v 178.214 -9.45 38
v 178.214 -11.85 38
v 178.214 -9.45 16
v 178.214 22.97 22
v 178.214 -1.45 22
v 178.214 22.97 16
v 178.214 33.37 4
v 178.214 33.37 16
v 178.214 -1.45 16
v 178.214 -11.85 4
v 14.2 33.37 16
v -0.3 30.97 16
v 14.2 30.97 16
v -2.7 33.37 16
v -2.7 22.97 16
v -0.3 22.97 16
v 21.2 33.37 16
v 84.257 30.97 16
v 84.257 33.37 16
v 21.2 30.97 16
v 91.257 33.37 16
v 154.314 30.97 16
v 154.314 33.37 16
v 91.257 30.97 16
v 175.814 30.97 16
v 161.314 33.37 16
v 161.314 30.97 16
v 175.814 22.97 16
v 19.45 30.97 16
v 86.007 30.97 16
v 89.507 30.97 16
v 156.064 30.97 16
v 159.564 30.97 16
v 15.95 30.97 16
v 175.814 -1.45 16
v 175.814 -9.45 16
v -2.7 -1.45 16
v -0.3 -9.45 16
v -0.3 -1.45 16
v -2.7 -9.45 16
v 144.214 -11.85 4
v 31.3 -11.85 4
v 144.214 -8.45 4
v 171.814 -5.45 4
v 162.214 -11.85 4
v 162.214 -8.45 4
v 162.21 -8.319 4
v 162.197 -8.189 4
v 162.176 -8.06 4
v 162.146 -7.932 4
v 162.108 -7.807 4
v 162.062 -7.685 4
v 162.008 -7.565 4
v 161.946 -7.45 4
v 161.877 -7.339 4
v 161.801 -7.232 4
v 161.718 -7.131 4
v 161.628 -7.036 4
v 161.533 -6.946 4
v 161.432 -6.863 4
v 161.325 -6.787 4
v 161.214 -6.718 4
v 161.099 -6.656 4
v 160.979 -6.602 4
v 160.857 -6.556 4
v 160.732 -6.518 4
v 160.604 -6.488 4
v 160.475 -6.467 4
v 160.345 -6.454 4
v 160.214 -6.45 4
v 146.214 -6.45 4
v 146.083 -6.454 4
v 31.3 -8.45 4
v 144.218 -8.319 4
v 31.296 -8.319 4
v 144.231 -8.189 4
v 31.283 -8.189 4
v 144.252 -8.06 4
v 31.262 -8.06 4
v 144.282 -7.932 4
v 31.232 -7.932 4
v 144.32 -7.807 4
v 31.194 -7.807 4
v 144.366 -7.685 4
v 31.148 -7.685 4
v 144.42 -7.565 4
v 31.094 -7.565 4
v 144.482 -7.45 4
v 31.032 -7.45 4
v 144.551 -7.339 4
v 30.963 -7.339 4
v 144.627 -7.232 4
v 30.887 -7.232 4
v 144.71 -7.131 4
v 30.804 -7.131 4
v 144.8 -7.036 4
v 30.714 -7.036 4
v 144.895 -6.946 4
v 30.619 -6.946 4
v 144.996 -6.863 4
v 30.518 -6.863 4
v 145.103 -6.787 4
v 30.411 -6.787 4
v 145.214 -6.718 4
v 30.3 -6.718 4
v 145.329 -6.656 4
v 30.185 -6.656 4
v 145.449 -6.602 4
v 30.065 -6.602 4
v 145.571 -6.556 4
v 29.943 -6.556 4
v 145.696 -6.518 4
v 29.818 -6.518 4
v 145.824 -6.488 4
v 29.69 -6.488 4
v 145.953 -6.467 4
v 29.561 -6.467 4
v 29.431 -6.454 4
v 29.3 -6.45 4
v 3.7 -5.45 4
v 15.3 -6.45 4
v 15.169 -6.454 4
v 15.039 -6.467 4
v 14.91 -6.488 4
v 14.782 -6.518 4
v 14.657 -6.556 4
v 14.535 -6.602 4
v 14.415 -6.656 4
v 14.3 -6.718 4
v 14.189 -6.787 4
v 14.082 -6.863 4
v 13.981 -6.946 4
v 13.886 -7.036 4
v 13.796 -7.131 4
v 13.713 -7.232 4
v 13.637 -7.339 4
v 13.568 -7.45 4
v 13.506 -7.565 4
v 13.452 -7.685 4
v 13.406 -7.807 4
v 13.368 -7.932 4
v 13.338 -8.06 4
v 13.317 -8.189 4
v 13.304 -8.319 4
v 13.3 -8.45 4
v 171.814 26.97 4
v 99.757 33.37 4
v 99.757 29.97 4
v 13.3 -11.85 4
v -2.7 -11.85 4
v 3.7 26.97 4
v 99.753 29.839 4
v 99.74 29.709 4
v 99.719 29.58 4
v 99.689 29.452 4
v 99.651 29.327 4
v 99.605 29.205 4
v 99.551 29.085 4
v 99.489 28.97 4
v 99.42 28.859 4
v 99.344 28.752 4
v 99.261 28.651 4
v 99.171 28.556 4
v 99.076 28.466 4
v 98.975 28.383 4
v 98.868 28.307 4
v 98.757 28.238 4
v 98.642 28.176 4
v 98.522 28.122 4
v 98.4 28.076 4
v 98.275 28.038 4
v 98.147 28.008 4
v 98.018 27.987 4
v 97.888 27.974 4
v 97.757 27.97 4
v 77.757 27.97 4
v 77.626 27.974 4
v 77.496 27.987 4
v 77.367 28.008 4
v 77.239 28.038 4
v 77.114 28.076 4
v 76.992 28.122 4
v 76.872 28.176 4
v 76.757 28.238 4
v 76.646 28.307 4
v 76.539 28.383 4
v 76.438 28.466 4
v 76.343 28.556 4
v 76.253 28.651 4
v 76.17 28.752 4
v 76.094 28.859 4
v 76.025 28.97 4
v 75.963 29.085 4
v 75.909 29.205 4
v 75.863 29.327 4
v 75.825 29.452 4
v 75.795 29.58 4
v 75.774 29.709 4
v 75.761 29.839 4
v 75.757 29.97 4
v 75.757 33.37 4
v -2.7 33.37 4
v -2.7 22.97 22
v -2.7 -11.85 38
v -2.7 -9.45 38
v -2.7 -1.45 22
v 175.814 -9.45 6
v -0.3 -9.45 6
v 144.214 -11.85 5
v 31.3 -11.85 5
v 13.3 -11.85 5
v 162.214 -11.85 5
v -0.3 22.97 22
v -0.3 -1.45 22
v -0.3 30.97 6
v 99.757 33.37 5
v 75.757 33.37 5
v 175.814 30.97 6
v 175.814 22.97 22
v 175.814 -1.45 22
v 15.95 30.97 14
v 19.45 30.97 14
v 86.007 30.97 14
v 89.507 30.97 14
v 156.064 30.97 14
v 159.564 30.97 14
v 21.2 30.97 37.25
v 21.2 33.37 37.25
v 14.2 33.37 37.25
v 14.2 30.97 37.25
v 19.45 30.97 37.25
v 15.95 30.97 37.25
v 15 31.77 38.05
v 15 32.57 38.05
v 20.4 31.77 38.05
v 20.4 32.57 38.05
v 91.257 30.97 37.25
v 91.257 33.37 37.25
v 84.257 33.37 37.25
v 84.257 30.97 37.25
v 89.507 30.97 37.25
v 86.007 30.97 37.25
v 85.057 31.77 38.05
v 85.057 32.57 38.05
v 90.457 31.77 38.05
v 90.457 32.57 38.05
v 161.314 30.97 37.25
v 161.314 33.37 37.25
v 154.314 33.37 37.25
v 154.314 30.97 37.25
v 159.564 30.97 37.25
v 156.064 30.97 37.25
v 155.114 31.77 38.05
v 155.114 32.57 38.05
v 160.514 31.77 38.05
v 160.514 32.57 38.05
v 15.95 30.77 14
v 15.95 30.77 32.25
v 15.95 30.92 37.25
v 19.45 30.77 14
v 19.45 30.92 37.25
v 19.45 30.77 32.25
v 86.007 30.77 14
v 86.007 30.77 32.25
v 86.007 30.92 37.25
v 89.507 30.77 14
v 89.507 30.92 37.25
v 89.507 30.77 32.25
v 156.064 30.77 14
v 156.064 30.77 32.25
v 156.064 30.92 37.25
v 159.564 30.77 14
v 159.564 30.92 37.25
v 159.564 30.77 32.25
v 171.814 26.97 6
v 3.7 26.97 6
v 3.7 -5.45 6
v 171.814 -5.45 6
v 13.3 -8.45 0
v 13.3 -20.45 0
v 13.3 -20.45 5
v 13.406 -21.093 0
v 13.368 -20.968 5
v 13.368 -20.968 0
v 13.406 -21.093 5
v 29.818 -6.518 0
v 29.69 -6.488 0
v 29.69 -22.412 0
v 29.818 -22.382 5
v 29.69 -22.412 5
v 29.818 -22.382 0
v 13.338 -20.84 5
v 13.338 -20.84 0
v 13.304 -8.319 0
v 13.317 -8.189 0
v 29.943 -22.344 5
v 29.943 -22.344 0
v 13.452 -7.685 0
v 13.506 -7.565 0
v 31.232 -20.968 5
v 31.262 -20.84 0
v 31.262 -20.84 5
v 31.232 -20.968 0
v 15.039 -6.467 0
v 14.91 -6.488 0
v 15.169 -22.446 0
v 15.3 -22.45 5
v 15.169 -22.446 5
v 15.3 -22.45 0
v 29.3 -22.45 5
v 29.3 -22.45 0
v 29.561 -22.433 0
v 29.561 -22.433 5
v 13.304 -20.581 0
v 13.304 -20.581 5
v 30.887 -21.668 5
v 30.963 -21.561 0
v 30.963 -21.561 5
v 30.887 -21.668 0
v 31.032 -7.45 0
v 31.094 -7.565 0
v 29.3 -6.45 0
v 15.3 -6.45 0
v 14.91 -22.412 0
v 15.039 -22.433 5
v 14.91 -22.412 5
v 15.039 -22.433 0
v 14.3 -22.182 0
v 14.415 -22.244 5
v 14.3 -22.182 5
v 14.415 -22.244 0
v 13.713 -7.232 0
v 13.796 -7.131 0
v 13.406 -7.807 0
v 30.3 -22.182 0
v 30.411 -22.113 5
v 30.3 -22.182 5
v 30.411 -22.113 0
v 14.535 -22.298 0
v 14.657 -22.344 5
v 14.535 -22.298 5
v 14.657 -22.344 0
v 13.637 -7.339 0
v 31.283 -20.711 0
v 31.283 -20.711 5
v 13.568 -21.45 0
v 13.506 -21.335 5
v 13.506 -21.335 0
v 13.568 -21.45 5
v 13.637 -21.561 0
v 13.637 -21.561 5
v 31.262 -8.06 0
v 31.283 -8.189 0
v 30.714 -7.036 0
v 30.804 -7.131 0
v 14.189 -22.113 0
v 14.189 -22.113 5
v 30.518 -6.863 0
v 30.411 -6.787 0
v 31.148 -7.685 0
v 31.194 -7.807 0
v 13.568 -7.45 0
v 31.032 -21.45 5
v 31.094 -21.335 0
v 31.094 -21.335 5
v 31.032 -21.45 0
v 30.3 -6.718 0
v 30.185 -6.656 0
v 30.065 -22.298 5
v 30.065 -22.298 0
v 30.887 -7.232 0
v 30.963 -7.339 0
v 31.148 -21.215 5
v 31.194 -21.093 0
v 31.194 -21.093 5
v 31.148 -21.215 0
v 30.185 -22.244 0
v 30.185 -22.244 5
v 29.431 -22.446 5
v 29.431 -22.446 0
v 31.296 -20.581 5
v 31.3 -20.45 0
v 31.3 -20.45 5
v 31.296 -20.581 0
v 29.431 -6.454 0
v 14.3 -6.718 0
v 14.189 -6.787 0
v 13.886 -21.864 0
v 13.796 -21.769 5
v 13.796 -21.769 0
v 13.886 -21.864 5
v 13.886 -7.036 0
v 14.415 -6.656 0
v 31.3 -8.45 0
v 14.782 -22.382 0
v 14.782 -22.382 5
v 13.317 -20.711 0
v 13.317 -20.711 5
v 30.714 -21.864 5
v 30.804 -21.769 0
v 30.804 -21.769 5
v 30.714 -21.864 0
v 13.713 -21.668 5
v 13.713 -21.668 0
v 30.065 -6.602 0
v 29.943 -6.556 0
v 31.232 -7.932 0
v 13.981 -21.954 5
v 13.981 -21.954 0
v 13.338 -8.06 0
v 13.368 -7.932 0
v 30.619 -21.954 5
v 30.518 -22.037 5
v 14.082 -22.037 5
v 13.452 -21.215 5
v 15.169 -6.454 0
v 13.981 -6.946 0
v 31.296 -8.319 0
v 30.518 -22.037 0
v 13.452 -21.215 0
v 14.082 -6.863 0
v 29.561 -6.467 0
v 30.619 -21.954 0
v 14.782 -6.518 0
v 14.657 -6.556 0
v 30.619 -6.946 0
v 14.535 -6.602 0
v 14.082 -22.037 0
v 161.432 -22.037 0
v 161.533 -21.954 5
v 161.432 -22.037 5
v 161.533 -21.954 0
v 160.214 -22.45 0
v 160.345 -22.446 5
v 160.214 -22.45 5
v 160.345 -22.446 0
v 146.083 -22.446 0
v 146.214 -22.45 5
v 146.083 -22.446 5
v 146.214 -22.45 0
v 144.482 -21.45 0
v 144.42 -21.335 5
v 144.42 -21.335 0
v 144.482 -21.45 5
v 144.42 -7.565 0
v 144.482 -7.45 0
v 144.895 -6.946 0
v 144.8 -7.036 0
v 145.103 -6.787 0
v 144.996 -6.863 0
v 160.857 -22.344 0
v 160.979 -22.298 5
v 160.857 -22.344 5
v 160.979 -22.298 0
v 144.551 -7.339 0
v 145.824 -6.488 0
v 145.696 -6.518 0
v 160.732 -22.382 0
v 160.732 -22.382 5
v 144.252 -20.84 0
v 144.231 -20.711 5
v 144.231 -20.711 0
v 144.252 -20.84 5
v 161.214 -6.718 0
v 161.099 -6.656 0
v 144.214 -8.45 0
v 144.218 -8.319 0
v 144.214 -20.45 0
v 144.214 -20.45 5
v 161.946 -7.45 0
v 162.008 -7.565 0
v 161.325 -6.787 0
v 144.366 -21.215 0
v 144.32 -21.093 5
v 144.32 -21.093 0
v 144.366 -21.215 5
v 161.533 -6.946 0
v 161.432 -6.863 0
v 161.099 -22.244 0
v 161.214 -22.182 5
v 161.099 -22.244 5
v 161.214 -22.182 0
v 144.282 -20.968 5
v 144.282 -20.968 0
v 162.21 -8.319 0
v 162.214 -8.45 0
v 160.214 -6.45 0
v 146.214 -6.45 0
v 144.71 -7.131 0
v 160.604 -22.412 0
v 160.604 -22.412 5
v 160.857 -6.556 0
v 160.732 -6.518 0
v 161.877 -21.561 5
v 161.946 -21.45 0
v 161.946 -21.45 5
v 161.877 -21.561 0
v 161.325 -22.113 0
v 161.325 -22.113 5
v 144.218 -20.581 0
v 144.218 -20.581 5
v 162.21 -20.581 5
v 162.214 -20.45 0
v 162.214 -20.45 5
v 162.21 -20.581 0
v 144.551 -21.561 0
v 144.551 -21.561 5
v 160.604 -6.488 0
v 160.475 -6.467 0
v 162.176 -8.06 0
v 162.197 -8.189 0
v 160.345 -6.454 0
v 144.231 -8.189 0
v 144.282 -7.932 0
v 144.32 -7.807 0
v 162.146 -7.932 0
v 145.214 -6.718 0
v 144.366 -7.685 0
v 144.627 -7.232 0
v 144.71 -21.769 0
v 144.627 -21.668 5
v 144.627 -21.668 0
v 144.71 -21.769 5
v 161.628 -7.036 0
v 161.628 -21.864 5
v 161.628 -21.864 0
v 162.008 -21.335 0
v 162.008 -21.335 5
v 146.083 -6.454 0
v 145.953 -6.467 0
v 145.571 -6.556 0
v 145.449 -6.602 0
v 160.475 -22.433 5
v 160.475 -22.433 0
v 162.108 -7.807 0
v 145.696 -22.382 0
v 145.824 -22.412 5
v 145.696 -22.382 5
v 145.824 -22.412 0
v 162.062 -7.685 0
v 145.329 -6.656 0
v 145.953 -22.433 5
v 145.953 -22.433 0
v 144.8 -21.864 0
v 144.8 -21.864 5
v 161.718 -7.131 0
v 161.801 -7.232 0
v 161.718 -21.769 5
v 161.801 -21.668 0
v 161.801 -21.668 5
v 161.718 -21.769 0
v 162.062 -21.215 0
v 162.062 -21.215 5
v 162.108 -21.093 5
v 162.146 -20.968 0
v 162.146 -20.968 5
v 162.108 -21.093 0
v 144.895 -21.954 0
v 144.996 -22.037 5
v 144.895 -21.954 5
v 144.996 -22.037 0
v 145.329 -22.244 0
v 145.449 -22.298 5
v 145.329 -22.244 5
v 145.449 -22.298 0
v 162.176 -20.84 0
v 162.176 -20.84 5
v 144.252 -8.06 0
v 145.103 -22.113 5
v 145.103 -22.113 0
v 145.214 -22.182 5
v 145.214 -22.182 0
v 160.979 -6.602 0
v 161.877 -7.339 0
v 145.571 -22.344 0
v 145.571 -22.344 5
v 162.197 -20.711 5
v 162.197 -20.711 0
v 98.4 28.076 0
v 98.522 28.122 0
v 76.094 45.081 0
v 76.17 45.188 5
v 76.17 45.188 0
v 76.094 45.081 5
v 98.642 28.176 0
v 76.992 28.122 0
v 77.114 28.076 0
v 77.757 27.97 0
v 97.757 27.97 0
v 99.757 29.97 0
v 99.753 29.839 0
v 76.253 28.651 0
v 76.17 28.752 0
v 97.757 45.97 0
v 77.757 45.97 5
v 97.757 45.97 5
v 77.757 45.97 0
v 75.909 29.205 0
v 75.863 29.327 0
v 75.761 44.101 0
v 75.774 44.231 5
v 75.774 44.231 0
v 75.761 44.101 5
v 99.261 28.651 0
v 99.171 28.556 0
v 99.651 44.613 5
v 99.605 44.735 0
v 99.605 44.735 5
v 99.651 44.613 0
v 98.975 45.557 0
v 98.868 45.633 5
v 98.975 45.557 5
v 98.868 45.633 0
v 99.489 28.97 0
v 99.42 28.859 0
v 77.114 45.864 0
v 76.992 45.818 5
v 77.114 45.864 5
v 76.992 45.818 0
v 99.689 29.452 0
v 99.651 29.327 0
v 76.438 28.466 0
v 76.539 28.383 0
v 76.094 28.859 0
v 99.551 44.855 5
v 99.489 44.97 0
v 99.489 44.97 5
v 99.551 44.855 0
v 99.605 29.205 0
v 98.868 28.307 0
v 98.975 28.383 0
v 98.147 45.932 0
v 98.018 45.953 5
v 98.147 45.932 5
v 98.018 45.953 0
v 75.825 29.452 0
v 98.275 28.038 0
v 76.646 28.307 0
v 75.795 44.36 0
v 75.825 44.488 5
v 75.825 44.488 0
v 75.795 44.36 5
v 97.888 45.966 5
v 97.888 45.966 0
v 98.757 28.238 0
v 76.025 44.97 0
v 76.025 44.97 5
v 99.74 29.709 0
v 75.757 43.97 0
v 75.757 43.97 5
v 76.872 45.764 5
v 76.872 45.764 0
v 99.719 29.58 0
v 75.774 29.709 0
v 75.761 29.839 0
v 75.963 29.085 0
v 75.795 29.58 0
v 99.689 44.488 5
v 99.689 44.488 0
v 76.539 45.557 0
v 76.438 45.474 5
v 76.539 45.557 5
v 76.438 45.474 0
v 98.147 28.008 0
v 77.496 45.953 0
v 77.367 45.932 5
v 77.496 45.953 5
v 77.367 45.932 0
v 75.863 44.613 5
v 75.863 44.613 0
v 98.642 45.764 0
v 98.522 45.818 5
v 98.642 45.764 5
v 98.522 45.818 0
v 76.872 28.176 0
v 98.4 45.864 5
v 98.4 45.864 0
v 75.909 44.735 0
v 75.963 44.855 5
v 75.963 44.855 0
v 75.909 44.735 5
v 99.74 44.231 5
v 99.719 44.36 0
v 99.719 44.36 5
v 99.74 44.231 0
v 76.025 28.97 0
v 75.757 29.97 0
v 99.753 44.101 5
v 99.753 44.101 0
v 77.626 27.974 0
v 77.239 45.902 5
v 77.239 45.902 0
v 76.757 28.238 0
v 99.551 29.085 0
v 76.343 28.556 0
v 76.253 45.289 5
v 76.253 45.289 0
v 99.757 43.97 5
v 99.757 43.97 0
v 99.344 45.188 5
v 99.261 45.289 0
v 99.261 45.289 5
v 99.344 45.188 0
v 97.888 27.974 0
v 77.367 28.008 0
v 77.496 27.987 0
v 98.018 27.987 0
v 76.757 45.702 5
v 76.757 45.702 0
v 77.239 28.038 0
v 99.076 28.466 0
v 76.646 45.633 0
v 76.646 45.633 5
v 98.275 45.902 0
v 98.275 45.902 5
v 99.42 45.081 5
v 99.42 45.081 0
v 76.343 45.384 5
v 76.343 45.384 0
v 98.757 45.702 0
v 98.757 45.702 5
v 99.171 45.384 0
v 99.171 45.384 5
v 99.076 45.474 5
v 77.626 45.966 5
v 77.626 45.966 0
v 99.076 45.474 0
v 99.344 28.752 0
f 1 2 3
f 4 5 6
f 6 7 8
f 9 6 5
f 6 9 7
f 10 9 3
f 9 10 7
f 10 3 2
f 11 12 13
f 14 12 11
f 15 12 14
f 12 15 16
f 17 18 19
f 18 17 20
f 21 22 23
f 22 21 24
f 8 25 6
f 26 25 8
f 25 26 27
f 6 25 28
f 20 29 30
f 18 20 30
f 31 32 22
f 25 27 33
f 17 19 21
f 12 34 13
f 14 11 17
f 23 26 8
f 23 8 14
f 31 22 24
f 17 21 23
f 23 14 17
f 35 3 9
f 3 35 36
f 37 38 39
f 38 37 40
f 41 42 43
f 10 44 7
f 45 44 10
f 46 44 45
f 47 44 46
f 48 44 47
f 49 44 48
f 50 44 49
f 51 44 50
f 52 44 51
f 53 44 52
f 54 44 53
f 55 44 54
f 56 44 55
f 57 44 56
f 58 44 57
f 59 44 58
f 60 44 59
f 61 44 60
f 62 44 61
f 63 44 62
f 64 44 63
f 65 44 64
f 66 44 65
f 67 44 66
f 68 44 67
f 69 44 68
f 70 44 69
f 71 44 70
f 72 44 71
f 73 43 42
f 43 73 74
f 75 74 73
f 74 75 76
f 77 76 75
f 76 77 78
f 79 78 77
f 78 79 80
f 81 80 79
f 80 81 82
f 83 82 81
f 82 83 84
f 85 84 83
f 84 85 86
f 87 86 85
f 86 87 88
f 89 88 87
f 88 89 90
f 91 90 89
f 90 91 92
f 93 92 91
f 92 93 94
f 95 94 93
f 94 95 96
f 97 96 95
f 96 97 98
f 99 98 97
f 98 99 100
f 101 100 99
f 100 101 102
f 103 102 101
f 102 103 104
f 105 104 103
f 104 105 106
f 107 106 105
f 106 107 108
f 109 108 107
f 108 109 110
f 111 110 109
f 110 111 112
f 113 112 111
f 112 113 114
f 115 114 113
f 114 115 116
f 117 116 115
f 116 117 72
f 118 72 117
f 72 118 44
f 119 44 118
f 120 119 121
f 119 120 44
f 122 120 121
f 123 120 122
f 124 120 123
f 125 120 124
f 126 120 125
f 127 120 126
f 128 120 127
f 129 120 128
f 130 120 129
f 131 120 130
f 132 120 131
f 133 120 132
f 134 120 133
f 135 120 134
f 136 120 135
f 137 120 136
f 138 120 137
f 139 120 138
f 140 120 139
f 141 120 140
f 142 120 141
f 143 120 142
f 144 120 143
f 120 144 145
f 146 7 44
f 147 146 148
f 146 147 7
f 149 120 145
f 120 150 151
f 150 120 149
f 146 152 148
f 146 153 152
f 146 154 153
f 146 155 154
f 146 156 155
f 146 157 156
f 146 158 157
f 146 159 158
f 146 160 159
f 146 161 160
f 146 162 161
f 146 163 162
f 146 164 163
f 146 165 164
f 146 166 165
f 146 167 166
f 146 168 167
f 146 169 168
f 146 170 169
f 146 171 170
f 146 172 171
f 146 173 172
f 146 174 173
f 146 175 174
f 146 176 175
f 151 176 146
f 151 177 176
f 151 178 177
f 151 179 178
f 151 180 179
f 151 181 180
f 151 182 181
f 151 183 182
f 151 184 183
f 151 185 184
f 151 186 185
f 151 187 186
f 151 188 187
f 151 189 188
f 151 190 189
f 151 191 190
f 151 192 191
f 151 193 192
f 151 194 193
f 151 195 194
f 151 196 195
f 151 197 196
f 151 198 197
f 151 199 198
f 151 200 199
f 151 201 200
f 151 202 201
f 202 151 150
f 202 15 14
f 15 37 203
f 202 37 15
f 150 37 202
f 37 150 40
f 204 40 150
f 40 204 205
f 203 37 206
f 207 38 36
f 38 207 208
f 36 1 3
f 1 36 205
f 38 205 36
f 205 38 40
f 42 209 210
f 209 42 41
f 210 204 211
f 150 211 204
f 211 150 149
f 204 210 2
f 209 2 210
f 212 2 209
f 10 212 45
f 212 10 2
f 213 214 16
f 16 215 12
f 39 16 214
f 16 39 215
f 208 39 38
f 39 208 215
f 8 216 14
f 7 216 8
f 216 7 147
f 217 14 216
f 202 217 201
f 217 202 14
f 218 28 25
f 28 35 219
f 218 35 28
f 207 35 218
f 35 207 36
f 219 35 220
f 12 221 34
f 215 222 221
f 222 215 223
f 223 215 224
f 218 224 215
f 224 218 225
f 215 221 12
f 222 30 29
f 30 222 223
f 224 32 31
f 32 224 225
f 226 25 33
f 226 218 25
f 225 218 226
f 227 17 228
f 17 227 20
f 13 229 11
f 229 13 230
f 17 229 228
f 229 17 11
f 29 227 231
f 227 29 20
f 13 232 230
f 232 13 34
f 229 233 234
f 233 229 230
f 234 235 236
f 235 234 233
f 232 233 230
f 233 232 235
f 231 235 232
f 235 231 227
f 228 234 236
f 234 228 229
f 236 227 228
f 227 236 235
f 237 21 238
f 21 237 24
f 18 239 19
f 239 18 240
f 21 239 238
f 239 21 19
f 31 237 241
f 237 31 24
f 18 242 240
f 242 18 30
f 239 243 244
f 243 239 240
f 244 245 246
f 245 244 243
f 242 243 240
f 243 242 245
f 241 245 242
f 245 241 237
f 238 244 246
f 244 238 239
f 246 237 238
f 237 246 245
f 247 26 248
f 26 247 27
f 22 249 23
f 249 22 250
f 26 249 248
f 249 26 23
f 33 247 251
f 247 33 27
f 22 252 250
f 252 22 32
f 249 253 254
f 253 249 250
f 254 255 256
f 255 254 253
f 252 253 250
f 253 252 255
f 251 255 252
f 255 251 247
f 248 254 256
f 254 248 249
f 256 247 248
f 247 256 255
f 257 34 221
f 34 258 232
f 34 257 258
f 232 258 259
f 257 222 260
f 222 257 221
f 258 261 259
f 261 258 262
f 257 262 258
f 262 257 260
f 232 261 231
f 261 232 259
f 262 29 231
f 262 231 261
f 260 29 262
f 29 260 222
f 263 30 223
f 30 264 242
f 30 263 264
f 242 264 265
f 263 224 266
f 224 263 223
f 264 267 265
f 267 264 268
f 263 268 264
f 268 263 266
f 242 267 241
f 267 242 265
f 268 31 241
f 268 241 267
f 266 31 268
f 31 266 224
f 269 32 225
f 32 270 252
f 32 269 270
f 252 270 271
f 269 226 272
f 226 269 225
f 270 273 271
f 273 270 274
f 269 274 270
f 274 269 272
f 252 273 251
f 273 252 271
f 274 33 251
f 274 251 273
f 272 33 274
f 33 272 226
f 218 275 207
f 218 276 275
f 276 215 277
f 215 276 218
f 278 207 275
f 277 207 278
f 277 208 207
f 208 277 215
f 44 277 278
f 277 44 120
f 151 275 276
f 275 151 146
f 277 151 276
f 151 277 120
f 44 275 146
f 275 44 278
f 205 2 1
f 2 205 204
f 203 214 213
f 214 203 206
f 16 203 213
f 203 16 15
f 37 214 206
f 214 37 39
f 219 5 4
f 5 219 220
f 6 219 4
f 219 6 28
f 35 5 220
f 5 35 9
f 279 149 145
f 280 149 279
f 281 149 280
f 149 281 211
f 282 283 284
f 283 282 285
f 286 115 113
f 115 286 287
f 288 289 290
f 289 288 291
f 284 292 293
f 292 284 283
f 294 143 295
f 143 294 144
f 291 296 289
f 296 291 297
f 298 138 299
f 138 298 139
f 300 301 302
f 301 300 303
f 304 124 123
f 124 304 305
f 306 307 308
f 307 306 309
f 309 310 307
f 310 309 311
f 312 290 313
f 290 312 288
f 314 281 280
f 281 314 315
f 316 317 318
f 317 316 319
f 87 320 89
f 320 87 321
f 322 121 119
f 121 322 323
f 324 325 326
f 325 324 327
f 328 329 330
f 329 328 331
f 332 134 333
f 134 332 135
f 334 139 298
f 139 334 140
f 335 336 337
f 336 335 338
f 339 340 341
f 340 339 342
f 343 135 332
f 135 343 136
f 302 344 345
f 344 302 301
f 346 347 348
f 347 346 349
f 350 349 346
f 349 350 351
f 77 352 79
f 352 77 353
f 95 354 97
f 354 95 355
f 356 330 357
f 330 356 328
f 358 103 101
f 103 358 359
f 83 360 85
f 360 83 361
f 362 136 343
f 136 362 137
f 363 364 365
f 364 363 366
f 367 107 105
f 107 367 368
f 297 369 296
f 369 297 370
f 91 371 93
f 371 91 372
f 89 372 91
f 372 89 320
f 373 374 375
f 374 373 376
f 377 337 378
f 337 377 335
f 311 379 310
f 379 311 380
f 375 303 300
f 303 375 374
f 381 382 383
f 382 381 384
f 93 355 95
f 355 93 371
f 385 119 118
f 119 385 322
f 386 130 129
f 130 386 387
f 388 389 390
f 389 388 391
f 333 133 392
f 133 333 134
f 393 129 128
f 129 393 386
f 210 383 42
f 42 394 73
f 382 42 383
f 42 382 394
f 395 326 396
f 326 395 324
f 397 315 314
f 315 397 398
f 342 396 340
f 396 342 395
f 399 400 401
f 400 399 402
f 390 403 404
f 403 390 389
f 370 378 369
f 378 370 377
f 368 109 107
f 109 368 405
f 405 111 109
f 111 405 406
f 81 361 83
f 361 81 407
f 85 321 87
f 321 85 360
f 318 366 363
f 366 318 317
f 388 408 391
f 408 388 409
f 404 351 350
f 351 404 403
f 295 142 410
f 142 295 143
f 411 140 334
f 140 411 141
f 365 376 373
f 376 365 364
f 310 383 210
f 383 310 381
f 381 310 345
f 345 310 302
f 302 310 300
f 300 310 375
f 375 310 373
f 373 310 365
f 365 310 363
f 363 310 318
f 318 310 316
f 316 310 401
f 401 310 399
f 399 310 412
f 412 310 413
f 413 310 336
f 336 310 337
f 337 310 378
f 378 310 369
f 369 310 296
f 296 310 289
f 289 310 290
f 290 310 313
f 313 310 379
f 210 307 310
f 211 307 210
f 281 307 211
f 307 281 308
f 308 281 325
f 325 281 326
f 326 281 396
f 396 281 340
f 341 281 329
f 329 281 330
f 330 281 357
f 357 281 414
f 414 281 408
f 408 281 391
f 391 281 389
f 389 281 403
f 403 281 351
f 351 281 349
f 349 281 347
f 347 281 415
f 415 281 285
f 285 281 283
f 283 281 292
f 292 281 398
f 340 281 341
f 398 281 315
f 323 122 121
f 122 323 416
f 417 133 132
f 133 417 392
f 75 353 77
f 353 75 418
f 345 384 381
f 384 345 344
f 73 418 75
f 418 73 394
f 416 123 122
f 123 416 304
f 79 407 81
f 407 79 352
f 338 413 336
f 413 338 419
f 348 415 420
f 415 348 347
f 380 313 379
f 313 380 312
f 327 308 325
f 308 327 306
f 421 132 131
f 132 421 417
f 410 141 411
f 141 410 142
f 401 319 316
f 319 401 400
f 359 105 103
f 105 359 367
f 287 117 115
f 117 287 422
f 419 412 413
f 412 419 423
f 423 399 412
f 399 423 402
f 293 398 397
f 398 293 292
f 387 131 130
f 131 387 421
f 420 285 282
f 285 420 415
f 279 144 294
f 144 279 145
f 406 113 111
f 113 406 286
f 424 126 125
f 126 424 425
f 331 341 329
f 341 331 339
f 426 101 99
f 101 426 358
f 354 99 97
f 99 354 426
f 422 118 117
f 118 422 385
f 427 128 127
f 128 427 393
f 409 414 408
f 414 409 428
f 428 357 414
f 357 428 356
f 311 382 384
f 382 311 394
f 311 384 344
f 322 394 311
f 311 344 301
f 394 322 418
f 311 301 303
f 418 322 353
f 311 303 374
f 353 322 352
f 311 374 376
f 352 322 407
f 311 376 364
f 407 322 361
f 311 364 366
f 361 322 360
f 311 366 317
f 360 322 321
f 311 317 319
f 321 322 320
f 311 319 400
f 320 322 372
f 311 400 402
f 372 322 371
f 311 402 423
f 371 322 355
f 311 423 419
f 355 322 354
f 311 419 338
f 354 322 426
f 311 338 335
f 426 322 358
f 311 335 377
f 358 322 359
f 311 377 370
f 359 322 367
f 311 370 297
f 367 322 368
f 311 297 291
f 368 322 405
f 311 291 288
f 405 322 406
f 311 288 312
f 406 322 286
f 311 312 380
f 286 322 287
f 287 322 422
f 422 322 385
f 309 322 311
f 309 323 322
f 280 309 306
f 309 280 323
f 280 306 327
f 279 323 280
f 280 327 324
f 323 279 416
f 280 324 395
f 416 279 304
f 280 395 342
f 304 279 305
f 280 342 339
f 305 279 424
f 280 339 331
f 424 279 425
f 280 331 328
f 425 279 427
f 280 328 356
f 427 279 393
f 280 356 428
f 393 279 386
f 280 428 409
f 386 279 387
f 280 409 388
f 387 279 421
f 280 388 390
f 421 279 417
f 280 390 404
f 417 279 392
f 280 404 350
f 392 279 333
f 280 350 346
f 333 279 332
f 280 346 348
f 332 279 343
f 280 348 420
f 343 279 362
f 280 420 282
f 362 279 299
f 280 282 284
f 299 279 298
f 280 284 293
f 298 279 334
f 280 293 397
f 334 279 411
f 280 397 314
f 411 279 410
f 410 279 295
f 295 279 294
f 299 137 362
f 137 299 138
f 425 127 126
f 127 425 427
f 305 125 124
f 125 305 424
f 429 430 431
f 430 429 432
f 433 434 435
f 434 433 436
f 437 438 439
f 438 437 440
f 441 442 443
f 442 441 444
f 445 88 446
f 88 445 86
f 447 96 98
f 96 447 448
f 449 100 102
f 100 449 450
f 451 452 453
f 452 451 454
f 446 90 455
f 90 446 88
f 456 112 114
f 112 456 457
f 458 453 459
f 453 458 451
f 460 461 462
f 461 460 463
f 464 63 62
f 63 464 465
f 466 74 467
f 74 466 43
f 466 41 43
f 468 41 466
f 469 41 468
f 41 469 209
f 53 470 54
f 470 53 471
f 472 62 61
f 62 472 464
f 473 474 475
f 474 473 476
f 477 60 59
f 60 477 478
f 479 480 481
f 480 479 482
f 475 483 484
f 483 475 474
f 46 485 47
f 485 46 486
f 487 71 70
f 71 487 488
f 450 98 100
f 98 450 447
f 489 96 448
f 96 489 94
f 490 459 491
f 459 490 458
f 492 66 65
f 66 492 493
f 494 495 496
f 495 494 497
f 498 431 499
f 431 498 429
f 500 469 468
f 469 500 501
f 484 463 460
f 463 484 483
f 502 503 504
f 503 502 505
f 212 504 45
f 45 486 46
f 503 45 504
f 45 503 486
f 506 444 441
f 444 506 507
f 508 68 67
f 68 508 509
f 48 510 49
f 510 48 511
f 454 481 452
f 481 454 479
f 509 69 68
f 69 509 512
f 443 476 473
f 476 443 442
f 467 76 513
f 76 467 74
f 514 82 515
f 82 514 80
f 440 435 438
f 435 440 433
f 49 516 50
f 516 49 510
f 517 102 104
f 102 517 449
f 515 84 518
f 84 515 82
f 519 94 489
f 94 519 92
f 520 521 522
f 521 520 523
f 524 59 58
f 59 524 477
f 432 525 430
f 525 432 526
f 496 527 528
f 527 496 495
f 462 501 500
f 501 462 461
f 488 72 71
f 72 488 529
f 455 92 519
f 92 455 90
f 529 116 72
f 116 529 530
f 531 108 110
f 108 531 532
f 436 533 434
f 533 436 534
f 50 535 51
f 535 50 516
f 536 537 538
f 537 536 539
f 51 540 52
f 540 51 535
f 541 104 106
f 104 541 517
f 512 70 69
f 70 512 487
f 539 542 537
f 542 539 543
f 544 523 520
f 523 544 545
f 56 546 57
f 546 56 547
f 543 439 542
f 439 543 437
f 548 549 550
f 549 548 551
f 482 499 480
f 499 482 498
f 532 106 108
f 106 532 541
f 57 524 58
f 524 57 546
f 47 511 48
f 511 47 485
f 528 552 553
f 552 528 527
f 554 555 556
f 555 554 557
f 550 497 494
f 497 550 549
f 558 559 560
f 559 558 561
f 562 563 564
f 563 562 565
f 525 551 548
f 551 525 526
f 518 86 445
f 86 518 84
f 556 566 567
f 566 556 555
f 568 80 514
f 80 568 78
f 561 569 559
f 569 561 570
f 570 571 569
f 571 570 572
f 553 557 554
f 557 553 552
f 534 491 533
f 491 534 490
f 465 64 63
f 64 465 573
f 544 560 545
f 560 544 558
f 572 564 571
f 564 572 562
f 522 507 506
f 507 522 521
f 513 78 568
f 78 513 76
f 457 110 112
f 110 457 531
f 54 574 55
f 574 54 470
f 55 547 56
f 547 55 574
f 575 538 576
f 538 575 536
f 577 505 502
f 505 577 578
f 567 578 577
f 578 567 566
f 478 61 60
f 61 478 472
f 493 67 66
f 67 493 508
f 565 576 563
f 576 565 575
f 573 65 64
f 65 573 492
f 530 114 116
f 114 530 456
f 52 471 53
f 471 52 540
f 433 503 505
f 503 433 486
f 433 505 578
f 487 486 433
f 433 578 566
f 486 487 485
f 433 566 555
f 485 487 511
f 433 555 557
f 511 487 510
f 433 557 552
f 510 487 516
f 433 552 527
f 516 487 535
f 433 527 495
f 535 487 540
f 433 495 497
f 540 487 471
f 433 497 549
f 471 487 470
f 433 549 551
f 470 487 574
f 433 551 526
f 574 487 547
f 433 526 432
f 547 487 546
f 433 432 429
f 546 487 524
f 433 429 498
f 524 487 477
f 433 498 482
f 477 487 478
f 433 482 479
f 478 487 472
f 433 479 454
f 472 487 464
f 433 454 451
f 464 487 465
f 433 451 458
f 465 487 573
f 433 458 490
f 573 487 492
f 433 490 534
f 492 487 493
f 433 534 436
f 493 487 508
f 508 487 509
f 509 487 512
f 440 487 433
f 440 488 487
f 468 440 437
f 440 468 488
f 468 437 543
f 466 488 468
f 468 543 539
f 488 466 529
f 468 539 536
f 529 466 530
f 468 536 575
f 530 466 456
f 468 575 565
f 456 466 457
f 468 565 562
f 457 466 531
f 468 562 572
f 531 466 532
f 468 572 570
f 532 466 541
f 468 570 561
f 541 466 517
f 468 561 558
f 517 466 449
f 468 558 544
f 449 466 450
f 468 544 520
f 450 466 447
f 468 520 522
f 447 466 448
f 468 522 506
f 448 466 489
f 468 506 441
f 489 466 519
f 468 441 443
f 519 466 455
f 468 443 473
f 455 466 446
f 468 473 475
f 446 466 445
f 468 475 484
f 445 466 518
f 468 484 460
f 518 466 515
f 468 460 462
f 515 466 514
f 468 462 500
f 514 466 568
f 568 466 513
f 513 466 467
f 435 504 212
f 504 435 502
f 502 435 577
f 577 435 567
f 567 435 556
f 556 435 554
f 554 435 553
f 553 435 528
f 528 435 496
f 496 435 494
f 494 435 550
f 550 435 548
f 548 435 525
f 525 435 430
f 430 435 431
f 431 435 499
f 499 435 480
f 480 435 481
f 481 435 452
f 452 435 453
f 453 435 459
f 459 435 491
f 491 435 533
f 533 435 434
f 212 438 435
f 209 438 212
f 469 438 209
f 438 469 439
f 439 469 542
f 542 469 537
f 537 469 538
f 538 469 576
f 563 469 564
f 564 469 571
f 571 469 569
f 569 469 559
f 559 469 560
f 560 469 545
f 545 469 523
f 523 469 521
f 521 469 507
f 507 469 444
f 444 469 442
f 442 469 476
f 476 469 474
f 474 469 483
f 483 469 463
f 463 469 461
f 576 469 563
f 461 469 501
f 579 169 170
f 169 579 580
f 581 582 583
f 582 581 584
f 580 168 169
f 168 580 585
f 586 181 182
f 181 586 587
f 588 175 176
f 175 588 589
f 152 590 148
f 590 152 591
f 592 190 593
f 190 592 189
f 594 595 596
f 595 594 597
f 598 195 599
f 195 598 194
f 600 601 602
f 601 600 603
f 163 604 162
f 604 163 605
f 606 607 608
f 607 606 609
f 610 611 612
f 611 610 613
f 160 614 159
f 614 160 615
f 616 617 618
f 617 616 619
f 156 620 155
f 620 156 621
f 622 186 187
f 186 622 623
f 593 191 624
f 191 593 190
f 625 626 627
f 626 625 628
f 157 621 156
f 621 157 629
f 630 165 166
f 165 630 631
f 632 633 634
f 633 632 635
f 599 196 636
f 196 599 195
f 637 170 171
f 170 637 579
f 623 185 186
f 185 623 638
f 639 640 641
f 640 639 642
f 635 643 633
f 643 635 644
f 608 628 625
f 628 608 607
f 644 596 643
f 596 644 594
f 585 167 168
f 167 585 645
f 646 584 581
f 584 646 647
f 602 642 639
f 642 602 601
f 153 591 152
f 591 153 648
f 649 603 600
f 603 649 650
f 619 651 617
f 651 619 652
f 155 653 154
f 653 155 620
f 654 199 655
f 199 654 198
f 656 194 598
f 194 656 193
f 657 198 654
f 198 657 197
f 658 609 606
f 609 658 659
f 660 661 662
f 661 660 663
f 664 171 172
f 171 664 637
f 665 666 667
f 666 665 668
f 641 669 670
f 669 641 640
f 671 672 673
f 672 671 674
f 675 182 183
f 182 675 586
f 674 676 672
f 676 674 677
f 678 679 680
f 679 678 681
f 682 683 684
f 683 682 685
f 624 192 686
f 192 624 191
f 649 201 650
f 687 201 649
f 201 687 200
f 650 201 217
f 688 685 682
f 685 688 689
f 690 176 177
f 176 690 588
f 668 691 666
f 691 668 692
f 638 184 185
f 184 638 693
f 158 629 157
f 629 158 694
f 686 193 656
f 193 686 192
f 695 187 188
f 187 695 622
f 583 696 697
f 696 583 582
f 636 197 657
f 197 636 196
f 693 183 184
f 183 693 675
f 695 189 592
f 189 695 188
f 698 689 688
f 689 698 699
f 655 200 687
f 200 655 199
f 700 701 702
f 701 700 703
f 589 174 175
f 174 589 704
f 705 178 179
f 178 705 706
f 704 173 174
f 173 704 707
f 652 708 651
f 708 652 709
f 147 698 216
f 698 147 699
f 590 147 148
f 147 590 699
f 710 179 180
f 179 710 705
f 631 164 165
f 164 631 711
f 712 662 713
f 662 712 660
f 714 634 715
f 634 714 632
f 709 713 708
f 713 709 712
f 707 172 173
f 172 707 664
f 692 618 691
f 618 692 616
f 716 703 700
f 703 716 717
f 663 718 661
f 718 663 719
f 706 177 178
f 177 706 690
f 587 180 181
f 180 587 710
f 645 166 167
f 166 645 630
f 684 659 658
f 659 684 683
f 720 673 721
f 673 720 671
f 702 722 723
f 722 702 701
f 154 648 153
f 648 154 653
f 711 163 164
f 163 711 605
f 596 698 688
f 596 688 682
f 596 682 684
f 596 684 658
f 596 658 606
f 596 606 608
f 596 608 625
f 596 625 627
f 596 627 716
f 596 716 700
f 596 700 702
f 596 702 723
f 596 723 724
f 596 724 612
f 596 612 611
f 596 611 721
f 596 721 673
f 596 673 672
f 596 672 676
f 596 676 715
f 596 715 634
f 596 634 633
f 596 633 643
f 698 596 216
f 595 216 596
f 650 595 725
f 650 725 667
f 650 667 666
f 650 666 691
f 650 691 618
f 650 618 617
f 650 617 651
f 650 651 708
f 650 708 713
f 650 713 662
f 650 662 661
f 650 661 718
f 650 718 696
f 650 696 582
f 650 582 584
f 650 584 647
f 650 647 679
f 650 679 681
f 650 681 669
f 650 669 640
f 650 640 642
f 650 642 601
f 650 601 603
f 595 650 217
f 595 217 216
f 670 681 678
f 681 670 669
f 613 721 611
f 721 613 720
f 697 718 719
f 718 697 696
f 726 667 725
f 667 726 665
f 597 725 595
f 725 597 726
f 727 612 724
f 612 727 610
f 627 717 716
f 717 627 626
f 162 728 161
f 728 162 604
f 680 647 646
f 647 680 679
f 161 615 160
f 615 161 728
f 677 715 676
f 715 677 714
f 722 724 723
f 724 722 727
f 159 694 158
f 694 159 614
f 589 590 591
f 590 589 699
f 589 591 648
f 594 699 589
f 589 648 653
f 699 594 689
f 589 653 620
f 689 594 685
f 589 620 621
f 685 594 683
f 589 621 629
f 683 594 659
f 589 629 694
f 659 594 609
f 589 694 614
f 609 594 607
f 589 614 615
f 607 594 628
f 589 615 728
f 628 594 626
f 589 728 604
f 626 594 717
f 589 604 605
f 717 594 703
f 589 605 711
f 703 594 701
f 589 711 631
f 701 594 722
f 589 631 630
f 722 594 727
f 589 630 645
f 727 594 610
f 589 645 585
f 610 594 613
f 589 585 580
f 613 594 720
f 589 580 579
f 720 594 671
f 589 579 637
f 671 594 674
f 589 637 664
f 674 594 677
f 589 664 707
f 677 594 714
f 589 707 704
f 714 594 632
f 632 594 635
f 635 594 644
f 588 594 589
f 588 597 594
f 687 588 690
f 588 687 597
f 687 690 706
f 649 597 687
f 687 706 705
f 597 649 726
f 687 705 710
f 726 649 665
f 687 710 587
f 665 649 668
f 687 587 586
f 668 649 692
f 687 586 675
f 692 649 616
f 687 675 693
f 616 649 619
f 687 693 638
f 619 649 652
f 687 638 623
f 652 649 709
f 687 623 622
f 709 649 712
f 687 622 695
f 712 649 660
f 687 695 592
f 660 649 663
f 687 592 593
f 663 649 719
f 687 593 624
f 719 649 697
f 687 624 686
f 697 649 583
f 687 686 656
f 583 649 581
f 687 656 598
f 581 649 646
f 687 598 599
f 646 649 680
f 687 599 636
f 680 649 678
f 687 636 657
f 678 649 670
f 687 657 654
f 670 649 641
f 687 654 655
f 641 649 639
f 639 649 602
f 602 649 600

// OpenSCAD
// DOUBLE TAKE FRAMES DESIGN RELEASE
// DTF_RELEASE: 1.0.0
// Released: 2026-08-30
// Versioning: Semantic Versioning 2.0.0 (https://semver.org/)
// Status: CANONICAL
// Changes in 1.0.0:
// - Initial versioned public design release.
// - Establishes the current accepted geometry as the 1.x compatibility baseline.
// Full release notes: https://doubletakeframes.com/build/#design-release
//
$fn = 96;
eps = 0.05;

// =========================================================
// DETACHABLE FRONT BAND + SIDE WALLS + REAR POSTS + FEETS
// Continuous low rail all around.
// Side walls sit on rail but do not connect to front/back above rail.
// Non-friction resting fit.
//
// Corrected:
// - Feet overlap collar/body in Z by foot_body_z_overlap, not just eps.
// - Each foot is shifted a few mm inward under the basket while keeping
//   the original front/rear foot depth.
// =========================================================

inch = 25.4;

// CASSETTE REFERENCE VALUES
cassette_w = 6.91 * inch;

bottom_t    = 3.0;
wall_t      = 3.0;
wall_offset = 0.0;

front_frame_t    = 1.2;
acrylic_gap      = 1.0;
spacer_thickness = 7.0;

front_buildout_total = front_frame_t + acrylic_gap + spacer_thickness;
front_buildout_y0    = wall_offset - front_buildout_total;

roller_r    = 0.75 * inch;
glide_t     = 2.0;
fang_embed  = 0.6;
rail_back_y = 8.0;
roller_cy   = wall_offset + wall_t;

glide_y  = roller_cy + roller_r - glide_t - fang_embed;
bottom_d = glide_y + glide_t + rail_back_y;

backing_board_extra_y = 1/20 * inch;

cassette_x0 = 0;
cassette_x1 = cassette_w;
cassette_y0 = front_buildout_y0;
cassette_y1 = bottom_d + backing_board_extra_y;

// FIT / GEOMETRY
clear_x = 0.3;
clear_y = 0.25;

collar_t = 2.4;

foot_h = 5.0;
foot_body_z_overlap = 1.0;
collar_z0 = foot_h - foot_body_z_overlap;

collar_h = 34.0;
side_wall_h = 18.0;
inner_x0 = cassette_x0 - clear_x;
inner_x1 = cassette_x1 + clear_x;
inner_y0 = cassette_y0 - clear_y;
inner_y1 = cassette_y1 + clear_y;

outer_x0 = inner_x0 - collar_t;
outer_x1 = inner_x1 + collar_t;
outer_y0 = inner_y0 - collar_t;
outer_y1 = inner_y1 + collar_t;

// RESTING LEDGE
rest_lip_t = 4.0;
rest_lip_h = 2.0;

// LOW RAIL
low_rail_h = 12.0;

// SIDE WALLS
side_wall_gap_front = 8.0;
side_wall_gap_rear  = 8.0;
side_wall_t = collar_t;

// REAR POSTS
rear_post_w = 7.0;
rear_post_t = collar_t;
post_bevel = 0.8;

// Localized friction take-up on the three rear backing-board capture posts.
// These project into the existing Y clearance without moving the posts or
// tightening the stand's overall envelope. The upper ramp eases insertion.
rear_post_friction_pad_d = 0.20;
rear_post_friction_pad_w = 3.5;
rear_post_friction_pad_z0 = collar_z0 + low_rail_h - 2.0;
rear_post_friction_pad_z1 = collar_z0 + collar_h - post_bevel;
rear_post_friction_ramp_h = 5.0;

// FEET
front_foot_proj = 16.0;
rear_foot_proj  = 18.0;

front_foot_w = 18.0;
rear_foot_w  = 24.0;

front_foot_inset_x = 16.0;
foot_round = 2.0;

// How far the inner edge of each foot reaches under the basket.
// Original effectively stopped ~0.6 mm short of the inner edge.
foot_y_overlap = 3.0;

// HELPERS
module rounded_rect_prism(x0, x1, y0, y1, z0, z1, r=2) {
    hull() {
        translate([x0+r, y0+r, z0]) cylinder(r=r, h=z1-z0);
        translate([x1-r, y0+r, z0]) cylinder(r=r, h=z1-z0);
        translate([x0+r, y1-r, z0]) cylinder(r=r, h=z1-z0);
        translate([x1-r, y1-r, z0]) cylinder(r=r, h=z1-z0);
    }
}

module beveled_post(xsz, ysz, h, b) {
    bx = min(b, xsz/2 - eps);
    by = min(b, ysz/2 - eps);

    union() {
        cube([xsz, ysz, h - b]);

        translate([0, 0, h - b])
        hull() {
            cube([xsz, ysz, eps]);

            translate([bx, by, b])
                cube([
                    max(eps, xsz - 2*bx),
                    max(eps, ysz - 2*by),
                    eps
                ]);
        }
    }
}

// FRONT BAND
module front_band() {
    translate([outer_x0, outer_y0, collar_z0])
        cube([
            outer_x1 - outer_x0,
            collar_t,
            collar_h
        ]);
}

// CONTINUOUS LOW RAIL
module front_low_rail() {
    translate([outer_x0, outer_y0, collar_z0])
        cube([outer_x1 - outer_x0, collar_t, low_rail_h]);
}

module left_low_rail() {
    translate([outer_x0, outer_y0, collar_z0])
        cube([collar_t, outer_y1 - outer_y0, low_rail_h]);
}

module right_low_rail() {
    translate([outer_x1 - collar_t, outer_y0, collar_z0])
        cube([collar_t, outer_y1 - outer_y0, low_rail_h]);
}

module rear_low_rail() {
    translate([outer_x0, outer_y1 - collar_t, collar_z0])
        cube([outer_x1 - outer_x0, collar_t, low_rail_h]);
}

module low_rails() {
    // front rail overlaps lower part of front band; harmless and strengthens base
    front_low_rail();
    left_low_rail();
    right_low_rail();
    rear_low_rail();
}

// SIDE WALLS
module left_side_wall() {
    y0 = inner_y0 + side_wall_gap_front;
    y1 = inner_y1 - side_wall_gap_rear;

    translate([outer_x0, y0, collar_z0])
        cube([
            side_wall_t,
            y1 - y0,
            side_wall_h
        ]);
}

module right_side_wall() {
    y0 = inner_y0 + side_wall_gap_front;
    y1 = inner_y1 - side_wall_gap_rear;

    translate([inner_x1, y0, collar_z0])
        cube([
            side_wall_t,
            y1 - y0,
            side_wall_h
        ]);
}

// REAR POSTS
module rear_post(x_center) {
    translate([x_center - rear_post_w/2, inner_y1, collar_z0])
        beveled_post(rear_post_w, rear_post_t, collar_h, post_bevel);
}

module rear_post_friction_pad(x_center) {
    pad_x0 = x_center - rear_post_friction_pad_w/2;
    full_pad_y0 = inner_y1 - rear_post_friction_pad_d;
    ramp_z0 = rear_post_friction_pad_z1 - rear_post_friction_ramp_h;

    hull() {
        translate([pad_x0, full_pad_y0, rear_post_friction_pad_z0])
            cube([rear_post_friction_pad_w, rear_post_friction_pad_d + eps, eps]);
        translate([pad_x0, full_pad_y0, ramp_z0])
            cube([rear_post_friction_pad_w, rear_post_friction_pad_d + eps, eps]);
        translate([pad_x0, inner_y1 - eps, rear_post_friction_pad_z1])
            cube([rear_post_friction_pad_w, 2*eps, eps]);
    }
}

module rear_posts() {
    left_post_x = inner_x0 + 18.0;
    center_post_x = (inner_x0 + inner_x1) / 2;
    right_post_x = inner_x1 - 18.0;

    rear_post(left_post_x);
    rear_post(center_post_x);
    rear_post(right_post_x);

    rear_post_friction_pad(left_post_x);
    rear_post_friction_pad(center_post_x);
    rear_post_friction_pad(right_post_x);
}

// BOTTOM RESTING LEDGE
module bottom_rest_lip() {
    translate([inner_x0, inner_y0, collar_z0])
        cube([inner_x1 - inner_x0, rest_lip_t, rest_lip_h]);

    translate([inner_x0, inner_y1 - rest_lip_t, collar_z0])
        cube([inner_x1 - inner_x0, rest_lip_t, rest_lip_h]);

    translate([inner_x0, inner_y0, collar_z0])
        cube([rest_lip_t, inner_y1 - inner_y0, rest_lip_h]);

    translate([inner_x1 - rest_lip_t, inner_y0, collar_z0])
        cube([rest_lip_t, inner_y1 - inner_y0, rest_lip_h]);
}

// FEET
module front_left_foot() {
    x0 = outer_x0 + front_foot_inset_x;
    x1 = x0 + front_foot_w;

    // Same foot depth as original, shifted inward for a few mm of underlap.
    y1 = inner_y0 + foot_y_overlap;
    y0 = y1 - front_foot_proj;

    rounded_rect_prism(x0, x1, y0, y1, 0, foot_h, foot_round);
}

module front_right_foot() {
    x1 = outer_x1 - front_foot_inset_x;
    x0 = x1 - front_foot_w;

    // Same foot depth as original, shifted inward for a few mm of underlap.
    y1 = inner_y0 + foot_y_overlap;
    y0 = y1 - front_foot_proj;

    rounded_rect_prism(x0, x1, y0, y1, 0, foot_h, foot_round);
}

module rear_center_foot() {
    x0 = (outer_x0 + outer_x1)/2 - rear_foot_w/2;
    x1 = x0 + rear_foot_w;

    // Same foot depth as original, shifted inward for a few mm of underlap.
    y0 = inner_y1 - foot_y_overlap;
    y1 = y0 + rear_foot_proj;

    rounded_rect_prism(x0, x1, y0, y1, 0, foot_h, foot_round);
}

// FINAL
union() {
    front_band();
    low_rails();

    left_side_wall();
    right_side_wall();
    rear_posts();

    bottom_rest_lip();

    front_left_foot();
    front_right_foot();
    rear_center_foot();
}
